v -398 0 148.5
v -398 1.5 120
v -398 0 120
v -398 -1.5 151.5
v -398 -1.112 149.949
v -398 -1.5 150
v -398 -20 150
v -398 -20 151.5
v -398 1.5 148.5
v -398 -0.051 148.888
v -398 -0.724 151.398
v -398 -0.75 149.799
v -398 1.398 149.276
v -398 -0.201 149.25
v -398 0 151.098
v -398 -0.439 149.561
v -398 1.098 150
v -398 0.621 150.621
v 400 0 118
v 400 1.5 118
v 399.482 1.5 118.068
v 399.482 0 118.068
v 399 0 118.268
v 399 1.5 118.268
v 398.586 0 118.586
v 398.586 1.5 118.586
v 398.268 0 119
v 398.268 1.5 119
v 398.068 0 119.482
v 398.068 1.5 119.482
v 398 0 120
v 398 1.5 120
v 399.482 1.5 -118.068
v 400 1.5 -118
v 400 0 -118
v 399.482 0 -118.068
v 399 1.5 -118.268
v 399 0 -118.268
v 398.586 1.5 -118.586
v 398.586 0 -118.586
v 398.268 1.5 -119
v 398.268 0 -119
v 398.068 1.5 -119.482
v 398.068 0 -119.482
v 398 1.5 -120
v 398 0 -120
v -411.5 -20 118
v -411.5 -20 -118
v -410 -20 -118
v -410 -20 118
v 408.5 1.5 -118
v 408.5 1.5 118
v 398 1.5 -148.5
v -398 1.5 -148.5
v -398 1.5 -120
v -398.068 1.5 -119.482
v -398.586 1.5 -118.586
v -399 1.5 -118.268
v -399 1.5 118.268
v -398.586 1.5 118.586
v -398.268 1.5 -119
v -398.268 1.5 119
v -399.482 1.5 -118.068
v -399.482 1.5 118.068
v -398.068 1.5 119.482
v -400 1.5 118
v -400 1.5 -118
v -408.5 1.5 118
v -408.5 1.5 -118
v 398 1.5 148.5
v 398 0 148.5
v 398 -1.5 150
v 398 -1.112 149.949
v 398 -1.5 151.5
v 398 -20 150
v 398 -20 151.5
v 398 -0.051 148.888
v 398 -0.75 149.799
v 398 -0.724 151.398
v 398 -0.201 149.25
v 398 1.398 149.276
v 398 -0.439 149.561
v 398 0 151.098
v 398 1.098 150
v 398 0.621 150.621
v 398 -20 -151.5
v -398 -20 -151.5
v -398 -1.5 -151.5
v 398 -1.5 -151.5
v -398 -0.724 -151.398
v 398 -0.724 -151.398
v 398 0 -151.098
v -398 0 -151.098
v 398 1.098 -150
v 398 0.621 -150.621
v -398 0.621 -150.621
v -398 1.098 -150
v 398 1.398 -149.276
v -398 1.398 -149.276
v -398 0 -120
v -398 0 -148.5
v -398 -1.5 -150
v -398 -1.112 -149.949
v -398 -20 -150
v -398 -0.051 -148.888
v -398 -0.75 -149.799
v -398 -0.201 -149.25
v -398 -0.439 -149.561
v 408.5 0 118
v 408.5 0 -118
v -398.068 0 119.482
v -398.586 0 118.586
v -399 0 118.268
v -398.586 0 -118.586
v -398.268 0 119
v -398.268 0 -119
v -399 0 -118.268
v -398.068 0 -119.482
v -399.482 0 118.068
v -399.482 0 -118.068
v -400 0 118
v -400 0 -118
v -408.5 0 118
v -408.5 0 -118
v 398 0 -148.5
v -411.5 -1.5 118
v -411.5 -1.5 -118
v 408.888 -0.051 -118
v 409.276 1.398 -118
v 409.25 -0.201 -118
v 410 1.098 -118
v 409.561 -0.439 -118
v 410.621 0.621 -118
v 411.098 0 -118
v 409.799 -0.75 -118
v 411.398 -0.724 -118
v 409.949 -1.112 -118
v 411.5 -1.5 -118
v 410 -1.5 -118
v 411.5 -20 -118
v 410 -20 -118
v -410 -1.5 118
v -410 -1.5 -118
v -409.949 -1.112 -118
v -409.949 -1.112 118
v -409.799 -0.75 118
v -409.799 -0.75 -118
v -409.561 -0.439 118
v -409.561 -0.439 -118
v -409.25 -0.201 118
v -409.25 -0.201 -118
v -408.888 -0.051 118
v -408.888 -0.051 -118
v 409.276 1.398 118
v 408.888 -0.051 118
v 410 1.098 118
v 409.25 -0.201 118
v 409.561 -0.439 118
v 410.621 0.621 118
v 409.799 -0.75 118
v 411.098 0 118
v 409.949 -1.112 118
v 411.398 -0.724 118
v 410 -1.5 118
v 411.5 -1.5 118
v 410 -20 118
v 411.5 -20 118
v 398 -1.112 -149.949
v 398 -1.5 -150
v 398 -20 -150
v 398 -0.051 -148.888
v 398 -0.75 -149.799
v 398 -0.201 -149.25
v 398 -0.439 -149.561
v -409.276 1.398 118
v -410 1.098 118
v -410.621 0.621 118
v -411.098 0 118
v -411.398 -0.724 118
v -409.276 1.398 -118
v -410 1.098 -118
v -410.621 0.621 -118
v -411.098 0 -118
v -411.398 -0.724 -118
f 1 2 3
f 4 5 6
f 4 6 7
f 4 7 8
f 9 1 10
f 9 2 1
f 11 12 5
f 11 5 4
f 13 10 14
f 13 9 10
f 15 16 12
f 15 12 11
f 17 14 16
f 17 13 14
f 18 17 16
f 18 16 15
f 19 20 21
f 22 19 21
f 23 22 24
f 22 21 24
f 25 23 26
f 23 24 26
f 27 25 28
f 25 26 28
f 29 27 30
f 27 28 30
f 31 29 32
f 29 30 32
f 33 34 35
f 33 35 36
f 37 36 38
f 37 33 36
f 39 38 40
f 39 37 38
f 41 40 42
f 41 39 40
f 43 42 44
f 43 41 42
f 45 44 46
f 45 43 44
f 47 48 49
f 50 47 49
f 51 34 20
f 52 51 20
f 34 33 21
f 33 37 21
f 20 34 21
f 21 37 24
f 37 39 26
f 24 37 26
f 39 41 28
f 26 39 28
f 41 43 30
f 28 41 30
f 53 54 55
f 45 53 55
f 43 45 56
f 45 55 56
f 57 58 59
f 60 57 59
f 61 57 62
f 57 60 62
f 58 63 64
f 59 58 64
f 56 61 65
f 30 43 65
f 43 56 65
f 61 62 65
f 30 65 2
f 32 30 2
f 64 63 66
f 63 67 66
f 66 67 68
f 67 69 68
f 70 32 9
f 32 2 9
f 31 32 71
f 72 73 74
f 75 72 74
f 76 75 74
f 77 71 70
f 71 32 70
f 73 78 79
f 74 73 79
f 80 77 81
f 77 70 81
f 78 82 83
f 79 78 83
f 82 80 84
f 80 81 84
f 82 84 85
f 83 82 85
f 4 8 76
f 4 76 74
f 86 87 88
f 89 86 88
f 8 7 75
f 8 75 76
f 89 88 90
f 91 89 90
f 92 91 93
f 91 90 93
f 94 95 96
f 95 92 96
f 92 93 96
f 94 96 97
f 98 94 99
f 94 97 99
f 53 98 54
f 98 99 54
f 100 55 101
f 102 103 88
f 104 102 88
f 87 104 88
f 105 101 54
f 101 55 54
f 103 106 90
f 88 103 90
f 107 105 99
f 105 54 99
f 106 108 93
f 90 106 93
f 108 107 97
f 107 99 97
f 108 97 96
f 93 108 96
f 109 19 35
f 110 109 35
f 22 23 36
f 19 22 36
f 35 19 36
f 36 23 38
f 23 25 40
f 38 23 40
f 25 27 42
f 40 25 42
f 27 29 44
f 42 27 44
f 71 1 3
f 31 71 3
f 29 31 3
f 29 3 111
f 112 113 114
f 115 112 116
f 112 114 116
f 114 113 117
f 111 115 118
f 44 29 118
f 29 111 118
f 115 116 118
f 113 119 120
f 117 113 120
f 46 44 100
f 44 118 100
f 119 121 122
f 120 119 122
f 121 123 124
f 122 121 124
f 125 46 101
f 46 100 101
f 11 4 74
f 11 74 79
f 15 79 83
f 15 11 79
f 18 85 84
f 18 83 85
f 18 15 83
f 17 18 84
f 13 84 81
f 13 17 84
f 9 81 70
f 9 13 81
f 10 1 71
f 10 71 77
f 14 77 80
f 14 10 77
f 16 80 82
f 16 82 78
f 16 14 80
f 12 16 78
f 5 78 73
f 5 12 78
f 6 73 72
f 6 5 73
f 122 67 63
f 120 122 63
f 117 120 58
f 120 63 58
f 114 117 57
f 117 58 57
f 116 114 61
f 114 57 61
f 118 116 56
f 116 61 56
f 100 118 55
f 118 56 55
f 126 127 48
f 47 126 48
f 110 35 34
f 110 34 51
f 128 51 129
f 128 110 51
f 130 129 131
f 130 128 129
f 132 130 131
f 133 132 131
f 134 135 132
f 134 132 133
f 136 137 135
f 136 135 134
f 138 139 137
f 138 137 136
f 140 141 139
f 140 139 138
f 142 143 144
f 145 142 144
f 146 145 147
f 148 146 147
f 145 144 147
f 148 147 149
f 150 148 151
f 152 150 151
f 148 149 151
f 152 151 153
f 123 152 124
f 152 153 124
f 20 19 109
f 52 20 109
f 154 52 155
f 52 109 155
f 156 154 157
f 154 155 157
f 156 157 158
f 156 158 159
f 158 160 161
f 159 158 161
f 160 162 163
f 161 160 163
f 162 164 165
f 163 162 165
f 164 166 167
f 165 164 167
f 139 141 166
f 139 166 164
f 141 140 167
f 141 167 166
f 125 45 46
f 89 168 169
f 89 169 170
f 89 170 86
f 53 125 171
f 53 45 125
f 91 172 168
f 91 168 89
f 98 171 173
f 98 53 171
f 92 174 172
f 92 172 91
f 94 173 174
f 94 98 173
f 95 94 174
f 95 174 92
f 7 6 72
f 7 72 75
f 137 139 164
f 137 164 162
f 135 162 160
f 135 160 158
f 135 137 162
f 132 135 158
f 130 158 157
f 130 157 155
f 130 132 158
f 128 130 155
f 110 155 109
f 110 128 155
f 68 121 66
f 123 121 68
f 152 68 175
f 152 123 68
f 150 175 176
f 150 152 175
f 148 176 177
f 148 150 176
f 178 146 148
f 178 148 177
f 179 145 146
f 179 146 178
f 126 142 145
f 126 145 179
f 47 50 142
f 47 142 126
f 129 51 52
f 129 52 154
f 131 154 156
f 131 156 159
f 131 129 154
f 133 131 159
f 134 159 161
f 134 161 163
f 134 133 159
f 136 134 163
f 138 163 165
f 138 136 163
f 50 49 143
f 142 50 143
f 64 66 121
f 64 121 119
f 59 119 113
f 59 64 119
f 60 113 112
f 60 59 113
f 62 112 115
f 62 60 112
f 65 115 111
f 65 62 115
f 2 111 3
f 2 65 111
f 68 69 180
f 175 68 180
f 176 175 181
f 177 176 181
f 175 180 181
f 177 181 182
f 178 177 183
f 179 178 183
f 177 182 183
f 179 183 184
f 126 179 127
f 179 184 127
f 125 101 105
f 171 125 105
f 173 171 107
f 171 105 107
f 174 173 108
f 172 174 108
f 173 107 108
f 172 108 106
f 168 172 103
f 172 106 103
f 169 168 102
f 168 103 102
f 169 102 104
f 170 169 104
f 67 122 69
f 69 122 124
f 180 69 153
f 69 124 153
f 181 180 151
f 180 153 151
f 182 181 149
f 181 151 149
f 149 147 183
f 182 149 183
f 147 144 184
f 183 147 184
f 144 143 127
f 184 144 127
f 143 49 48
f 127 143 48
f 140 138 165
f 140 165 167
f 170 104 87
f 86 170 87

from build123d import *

# Parameters (mm, degrees)
SM_BASE_FLANGE_1_DEPTH           = 410
CUT_EXTRUDE_1_DEPTH              = 438.623696799
SM_EDGE_FLANGE_1_STRIP_W         = 9
SM_EDGE_FLANGE_1_STRIP_H         = 1.5
SM_EDGE_FLANGE_1_STRIP_CUT_DEPTH = 118
SM_EDGE_FLANGE_1_DEPTH           = 118


# Sheet-metal steps are written as plain solids
with BuildPart() as part:
    # Sketch 1 → Базовая кромка1 (new body)
    with BuildSketch(Plane(origin=(0, 0, 0), x_dir=(0, 0, -1), z_dir=(1, 0, 0))):
        with BuildLine():
            Line((0, 0), (-148.5, 0))
            ThreePointArc((-148.5, 0), (-149.560660172, -0.439339828), (-150, -1.5))
            Line((-150, -1.5), (-150, -20))
            Line((-150, -20), (-151.5, -20))
            Line((-151.5, -20), (-151.5, -1.5))
            ThreePointArc((-151.5, -1.5), (-150.621320344, 0.621320344), (-148.5, 1.5))
            Line((-148.5, 1.5), (0, 1.5))
            Line((0, 1.5), (0, 0))
        make_face()
    extrude(amount=-SM_BASE_FLANGE_1_DEPTH)

    # Эскиз9 → Вырез-Вытянуть1 (cut, through all)
    with BuildSketch(Plane(origin=(0, 1.5, 0), x_dir=(1, 0, 0), z_dir=(0, 1, 0))):
        with BuildLine():
            Line((-410, -118), (-400, -118))
            ThreePointArc((-400, -118), (-398.585786438, -118.585786438), (-398, -120))
            Line((-398, -120), (-398, -151.5))
            Line((-398, -151.5), (-410, -151.5))
            Line((-410, -151.5), (-410, -118))
        make_face()
    extrude(amount=-CUT_EXTRUDE_1_DEPTH, mode=Mode.SUBTRACT)

    # Ребро-кромка1 strip (across the edge) → Ребро-кромка1 strip cut (cut)
    with BuildSketch(Plane(origin=(-410, 0, 118), x_dir=(1, 0, 0), z_dir=(0, 0, -1))):
        with Locations((-3, -0.75)):
            Rectangle(SM_EDGE_FLANGE_1_STRIP_W, SM_EDGE_FLANGE_1_STRIP_H)
    extrude(amount=SM_EDGE_FLANGE_1_STRIP_CUT_DEPTH, mode=Mode.SUBTRACT)

    # Ребро-кромка1 section (across the edge) → Ребро-кромка1 (add)
    with BuildSketch(Plane(origin=(-410, 0, 118), x_dir=(1, 0, 0), z_dir=(0, 0, -1))):
        with BuildLine():
            Line((-1.5, 1.5), (-1.5, 20))
            Line((-1.5, 20), (0, 20))
            Line((0, 20), (0, 1.5))
            ThreePointArc((0, 1.5), (0.439339828, 0.439339828), (1.5, 0))
            Line((1.5, 0), (1.5, -1.5))
            ThreePointArc((1.5, -1.5), (-0.621320344, -0.621320344), (-1.5, 1.5))
        make_face()
    extrude(amount=SM_EDGE_FLANGE_1_DEPTH)

    # Зеркальное отражение1: part across plane


with BuildPart() as part_1:
    add(part.part)
    add(part.part.mirror(Plane(origin=(-568.017972801, 1.5, 0), x_dir=(1, 0, 0), z_dir=(0, 0, 1))))

    # Зеркальное отражение2: part across plane


with BuildPart() as part_2:
    add(part_1.part)
    add(part_1.part.mirror(Plane(origin=(0, 1.5, 148.5), x_dir=(0, 0, 1), z_dir=(1, 0, 0))))


solid = part_2.part
